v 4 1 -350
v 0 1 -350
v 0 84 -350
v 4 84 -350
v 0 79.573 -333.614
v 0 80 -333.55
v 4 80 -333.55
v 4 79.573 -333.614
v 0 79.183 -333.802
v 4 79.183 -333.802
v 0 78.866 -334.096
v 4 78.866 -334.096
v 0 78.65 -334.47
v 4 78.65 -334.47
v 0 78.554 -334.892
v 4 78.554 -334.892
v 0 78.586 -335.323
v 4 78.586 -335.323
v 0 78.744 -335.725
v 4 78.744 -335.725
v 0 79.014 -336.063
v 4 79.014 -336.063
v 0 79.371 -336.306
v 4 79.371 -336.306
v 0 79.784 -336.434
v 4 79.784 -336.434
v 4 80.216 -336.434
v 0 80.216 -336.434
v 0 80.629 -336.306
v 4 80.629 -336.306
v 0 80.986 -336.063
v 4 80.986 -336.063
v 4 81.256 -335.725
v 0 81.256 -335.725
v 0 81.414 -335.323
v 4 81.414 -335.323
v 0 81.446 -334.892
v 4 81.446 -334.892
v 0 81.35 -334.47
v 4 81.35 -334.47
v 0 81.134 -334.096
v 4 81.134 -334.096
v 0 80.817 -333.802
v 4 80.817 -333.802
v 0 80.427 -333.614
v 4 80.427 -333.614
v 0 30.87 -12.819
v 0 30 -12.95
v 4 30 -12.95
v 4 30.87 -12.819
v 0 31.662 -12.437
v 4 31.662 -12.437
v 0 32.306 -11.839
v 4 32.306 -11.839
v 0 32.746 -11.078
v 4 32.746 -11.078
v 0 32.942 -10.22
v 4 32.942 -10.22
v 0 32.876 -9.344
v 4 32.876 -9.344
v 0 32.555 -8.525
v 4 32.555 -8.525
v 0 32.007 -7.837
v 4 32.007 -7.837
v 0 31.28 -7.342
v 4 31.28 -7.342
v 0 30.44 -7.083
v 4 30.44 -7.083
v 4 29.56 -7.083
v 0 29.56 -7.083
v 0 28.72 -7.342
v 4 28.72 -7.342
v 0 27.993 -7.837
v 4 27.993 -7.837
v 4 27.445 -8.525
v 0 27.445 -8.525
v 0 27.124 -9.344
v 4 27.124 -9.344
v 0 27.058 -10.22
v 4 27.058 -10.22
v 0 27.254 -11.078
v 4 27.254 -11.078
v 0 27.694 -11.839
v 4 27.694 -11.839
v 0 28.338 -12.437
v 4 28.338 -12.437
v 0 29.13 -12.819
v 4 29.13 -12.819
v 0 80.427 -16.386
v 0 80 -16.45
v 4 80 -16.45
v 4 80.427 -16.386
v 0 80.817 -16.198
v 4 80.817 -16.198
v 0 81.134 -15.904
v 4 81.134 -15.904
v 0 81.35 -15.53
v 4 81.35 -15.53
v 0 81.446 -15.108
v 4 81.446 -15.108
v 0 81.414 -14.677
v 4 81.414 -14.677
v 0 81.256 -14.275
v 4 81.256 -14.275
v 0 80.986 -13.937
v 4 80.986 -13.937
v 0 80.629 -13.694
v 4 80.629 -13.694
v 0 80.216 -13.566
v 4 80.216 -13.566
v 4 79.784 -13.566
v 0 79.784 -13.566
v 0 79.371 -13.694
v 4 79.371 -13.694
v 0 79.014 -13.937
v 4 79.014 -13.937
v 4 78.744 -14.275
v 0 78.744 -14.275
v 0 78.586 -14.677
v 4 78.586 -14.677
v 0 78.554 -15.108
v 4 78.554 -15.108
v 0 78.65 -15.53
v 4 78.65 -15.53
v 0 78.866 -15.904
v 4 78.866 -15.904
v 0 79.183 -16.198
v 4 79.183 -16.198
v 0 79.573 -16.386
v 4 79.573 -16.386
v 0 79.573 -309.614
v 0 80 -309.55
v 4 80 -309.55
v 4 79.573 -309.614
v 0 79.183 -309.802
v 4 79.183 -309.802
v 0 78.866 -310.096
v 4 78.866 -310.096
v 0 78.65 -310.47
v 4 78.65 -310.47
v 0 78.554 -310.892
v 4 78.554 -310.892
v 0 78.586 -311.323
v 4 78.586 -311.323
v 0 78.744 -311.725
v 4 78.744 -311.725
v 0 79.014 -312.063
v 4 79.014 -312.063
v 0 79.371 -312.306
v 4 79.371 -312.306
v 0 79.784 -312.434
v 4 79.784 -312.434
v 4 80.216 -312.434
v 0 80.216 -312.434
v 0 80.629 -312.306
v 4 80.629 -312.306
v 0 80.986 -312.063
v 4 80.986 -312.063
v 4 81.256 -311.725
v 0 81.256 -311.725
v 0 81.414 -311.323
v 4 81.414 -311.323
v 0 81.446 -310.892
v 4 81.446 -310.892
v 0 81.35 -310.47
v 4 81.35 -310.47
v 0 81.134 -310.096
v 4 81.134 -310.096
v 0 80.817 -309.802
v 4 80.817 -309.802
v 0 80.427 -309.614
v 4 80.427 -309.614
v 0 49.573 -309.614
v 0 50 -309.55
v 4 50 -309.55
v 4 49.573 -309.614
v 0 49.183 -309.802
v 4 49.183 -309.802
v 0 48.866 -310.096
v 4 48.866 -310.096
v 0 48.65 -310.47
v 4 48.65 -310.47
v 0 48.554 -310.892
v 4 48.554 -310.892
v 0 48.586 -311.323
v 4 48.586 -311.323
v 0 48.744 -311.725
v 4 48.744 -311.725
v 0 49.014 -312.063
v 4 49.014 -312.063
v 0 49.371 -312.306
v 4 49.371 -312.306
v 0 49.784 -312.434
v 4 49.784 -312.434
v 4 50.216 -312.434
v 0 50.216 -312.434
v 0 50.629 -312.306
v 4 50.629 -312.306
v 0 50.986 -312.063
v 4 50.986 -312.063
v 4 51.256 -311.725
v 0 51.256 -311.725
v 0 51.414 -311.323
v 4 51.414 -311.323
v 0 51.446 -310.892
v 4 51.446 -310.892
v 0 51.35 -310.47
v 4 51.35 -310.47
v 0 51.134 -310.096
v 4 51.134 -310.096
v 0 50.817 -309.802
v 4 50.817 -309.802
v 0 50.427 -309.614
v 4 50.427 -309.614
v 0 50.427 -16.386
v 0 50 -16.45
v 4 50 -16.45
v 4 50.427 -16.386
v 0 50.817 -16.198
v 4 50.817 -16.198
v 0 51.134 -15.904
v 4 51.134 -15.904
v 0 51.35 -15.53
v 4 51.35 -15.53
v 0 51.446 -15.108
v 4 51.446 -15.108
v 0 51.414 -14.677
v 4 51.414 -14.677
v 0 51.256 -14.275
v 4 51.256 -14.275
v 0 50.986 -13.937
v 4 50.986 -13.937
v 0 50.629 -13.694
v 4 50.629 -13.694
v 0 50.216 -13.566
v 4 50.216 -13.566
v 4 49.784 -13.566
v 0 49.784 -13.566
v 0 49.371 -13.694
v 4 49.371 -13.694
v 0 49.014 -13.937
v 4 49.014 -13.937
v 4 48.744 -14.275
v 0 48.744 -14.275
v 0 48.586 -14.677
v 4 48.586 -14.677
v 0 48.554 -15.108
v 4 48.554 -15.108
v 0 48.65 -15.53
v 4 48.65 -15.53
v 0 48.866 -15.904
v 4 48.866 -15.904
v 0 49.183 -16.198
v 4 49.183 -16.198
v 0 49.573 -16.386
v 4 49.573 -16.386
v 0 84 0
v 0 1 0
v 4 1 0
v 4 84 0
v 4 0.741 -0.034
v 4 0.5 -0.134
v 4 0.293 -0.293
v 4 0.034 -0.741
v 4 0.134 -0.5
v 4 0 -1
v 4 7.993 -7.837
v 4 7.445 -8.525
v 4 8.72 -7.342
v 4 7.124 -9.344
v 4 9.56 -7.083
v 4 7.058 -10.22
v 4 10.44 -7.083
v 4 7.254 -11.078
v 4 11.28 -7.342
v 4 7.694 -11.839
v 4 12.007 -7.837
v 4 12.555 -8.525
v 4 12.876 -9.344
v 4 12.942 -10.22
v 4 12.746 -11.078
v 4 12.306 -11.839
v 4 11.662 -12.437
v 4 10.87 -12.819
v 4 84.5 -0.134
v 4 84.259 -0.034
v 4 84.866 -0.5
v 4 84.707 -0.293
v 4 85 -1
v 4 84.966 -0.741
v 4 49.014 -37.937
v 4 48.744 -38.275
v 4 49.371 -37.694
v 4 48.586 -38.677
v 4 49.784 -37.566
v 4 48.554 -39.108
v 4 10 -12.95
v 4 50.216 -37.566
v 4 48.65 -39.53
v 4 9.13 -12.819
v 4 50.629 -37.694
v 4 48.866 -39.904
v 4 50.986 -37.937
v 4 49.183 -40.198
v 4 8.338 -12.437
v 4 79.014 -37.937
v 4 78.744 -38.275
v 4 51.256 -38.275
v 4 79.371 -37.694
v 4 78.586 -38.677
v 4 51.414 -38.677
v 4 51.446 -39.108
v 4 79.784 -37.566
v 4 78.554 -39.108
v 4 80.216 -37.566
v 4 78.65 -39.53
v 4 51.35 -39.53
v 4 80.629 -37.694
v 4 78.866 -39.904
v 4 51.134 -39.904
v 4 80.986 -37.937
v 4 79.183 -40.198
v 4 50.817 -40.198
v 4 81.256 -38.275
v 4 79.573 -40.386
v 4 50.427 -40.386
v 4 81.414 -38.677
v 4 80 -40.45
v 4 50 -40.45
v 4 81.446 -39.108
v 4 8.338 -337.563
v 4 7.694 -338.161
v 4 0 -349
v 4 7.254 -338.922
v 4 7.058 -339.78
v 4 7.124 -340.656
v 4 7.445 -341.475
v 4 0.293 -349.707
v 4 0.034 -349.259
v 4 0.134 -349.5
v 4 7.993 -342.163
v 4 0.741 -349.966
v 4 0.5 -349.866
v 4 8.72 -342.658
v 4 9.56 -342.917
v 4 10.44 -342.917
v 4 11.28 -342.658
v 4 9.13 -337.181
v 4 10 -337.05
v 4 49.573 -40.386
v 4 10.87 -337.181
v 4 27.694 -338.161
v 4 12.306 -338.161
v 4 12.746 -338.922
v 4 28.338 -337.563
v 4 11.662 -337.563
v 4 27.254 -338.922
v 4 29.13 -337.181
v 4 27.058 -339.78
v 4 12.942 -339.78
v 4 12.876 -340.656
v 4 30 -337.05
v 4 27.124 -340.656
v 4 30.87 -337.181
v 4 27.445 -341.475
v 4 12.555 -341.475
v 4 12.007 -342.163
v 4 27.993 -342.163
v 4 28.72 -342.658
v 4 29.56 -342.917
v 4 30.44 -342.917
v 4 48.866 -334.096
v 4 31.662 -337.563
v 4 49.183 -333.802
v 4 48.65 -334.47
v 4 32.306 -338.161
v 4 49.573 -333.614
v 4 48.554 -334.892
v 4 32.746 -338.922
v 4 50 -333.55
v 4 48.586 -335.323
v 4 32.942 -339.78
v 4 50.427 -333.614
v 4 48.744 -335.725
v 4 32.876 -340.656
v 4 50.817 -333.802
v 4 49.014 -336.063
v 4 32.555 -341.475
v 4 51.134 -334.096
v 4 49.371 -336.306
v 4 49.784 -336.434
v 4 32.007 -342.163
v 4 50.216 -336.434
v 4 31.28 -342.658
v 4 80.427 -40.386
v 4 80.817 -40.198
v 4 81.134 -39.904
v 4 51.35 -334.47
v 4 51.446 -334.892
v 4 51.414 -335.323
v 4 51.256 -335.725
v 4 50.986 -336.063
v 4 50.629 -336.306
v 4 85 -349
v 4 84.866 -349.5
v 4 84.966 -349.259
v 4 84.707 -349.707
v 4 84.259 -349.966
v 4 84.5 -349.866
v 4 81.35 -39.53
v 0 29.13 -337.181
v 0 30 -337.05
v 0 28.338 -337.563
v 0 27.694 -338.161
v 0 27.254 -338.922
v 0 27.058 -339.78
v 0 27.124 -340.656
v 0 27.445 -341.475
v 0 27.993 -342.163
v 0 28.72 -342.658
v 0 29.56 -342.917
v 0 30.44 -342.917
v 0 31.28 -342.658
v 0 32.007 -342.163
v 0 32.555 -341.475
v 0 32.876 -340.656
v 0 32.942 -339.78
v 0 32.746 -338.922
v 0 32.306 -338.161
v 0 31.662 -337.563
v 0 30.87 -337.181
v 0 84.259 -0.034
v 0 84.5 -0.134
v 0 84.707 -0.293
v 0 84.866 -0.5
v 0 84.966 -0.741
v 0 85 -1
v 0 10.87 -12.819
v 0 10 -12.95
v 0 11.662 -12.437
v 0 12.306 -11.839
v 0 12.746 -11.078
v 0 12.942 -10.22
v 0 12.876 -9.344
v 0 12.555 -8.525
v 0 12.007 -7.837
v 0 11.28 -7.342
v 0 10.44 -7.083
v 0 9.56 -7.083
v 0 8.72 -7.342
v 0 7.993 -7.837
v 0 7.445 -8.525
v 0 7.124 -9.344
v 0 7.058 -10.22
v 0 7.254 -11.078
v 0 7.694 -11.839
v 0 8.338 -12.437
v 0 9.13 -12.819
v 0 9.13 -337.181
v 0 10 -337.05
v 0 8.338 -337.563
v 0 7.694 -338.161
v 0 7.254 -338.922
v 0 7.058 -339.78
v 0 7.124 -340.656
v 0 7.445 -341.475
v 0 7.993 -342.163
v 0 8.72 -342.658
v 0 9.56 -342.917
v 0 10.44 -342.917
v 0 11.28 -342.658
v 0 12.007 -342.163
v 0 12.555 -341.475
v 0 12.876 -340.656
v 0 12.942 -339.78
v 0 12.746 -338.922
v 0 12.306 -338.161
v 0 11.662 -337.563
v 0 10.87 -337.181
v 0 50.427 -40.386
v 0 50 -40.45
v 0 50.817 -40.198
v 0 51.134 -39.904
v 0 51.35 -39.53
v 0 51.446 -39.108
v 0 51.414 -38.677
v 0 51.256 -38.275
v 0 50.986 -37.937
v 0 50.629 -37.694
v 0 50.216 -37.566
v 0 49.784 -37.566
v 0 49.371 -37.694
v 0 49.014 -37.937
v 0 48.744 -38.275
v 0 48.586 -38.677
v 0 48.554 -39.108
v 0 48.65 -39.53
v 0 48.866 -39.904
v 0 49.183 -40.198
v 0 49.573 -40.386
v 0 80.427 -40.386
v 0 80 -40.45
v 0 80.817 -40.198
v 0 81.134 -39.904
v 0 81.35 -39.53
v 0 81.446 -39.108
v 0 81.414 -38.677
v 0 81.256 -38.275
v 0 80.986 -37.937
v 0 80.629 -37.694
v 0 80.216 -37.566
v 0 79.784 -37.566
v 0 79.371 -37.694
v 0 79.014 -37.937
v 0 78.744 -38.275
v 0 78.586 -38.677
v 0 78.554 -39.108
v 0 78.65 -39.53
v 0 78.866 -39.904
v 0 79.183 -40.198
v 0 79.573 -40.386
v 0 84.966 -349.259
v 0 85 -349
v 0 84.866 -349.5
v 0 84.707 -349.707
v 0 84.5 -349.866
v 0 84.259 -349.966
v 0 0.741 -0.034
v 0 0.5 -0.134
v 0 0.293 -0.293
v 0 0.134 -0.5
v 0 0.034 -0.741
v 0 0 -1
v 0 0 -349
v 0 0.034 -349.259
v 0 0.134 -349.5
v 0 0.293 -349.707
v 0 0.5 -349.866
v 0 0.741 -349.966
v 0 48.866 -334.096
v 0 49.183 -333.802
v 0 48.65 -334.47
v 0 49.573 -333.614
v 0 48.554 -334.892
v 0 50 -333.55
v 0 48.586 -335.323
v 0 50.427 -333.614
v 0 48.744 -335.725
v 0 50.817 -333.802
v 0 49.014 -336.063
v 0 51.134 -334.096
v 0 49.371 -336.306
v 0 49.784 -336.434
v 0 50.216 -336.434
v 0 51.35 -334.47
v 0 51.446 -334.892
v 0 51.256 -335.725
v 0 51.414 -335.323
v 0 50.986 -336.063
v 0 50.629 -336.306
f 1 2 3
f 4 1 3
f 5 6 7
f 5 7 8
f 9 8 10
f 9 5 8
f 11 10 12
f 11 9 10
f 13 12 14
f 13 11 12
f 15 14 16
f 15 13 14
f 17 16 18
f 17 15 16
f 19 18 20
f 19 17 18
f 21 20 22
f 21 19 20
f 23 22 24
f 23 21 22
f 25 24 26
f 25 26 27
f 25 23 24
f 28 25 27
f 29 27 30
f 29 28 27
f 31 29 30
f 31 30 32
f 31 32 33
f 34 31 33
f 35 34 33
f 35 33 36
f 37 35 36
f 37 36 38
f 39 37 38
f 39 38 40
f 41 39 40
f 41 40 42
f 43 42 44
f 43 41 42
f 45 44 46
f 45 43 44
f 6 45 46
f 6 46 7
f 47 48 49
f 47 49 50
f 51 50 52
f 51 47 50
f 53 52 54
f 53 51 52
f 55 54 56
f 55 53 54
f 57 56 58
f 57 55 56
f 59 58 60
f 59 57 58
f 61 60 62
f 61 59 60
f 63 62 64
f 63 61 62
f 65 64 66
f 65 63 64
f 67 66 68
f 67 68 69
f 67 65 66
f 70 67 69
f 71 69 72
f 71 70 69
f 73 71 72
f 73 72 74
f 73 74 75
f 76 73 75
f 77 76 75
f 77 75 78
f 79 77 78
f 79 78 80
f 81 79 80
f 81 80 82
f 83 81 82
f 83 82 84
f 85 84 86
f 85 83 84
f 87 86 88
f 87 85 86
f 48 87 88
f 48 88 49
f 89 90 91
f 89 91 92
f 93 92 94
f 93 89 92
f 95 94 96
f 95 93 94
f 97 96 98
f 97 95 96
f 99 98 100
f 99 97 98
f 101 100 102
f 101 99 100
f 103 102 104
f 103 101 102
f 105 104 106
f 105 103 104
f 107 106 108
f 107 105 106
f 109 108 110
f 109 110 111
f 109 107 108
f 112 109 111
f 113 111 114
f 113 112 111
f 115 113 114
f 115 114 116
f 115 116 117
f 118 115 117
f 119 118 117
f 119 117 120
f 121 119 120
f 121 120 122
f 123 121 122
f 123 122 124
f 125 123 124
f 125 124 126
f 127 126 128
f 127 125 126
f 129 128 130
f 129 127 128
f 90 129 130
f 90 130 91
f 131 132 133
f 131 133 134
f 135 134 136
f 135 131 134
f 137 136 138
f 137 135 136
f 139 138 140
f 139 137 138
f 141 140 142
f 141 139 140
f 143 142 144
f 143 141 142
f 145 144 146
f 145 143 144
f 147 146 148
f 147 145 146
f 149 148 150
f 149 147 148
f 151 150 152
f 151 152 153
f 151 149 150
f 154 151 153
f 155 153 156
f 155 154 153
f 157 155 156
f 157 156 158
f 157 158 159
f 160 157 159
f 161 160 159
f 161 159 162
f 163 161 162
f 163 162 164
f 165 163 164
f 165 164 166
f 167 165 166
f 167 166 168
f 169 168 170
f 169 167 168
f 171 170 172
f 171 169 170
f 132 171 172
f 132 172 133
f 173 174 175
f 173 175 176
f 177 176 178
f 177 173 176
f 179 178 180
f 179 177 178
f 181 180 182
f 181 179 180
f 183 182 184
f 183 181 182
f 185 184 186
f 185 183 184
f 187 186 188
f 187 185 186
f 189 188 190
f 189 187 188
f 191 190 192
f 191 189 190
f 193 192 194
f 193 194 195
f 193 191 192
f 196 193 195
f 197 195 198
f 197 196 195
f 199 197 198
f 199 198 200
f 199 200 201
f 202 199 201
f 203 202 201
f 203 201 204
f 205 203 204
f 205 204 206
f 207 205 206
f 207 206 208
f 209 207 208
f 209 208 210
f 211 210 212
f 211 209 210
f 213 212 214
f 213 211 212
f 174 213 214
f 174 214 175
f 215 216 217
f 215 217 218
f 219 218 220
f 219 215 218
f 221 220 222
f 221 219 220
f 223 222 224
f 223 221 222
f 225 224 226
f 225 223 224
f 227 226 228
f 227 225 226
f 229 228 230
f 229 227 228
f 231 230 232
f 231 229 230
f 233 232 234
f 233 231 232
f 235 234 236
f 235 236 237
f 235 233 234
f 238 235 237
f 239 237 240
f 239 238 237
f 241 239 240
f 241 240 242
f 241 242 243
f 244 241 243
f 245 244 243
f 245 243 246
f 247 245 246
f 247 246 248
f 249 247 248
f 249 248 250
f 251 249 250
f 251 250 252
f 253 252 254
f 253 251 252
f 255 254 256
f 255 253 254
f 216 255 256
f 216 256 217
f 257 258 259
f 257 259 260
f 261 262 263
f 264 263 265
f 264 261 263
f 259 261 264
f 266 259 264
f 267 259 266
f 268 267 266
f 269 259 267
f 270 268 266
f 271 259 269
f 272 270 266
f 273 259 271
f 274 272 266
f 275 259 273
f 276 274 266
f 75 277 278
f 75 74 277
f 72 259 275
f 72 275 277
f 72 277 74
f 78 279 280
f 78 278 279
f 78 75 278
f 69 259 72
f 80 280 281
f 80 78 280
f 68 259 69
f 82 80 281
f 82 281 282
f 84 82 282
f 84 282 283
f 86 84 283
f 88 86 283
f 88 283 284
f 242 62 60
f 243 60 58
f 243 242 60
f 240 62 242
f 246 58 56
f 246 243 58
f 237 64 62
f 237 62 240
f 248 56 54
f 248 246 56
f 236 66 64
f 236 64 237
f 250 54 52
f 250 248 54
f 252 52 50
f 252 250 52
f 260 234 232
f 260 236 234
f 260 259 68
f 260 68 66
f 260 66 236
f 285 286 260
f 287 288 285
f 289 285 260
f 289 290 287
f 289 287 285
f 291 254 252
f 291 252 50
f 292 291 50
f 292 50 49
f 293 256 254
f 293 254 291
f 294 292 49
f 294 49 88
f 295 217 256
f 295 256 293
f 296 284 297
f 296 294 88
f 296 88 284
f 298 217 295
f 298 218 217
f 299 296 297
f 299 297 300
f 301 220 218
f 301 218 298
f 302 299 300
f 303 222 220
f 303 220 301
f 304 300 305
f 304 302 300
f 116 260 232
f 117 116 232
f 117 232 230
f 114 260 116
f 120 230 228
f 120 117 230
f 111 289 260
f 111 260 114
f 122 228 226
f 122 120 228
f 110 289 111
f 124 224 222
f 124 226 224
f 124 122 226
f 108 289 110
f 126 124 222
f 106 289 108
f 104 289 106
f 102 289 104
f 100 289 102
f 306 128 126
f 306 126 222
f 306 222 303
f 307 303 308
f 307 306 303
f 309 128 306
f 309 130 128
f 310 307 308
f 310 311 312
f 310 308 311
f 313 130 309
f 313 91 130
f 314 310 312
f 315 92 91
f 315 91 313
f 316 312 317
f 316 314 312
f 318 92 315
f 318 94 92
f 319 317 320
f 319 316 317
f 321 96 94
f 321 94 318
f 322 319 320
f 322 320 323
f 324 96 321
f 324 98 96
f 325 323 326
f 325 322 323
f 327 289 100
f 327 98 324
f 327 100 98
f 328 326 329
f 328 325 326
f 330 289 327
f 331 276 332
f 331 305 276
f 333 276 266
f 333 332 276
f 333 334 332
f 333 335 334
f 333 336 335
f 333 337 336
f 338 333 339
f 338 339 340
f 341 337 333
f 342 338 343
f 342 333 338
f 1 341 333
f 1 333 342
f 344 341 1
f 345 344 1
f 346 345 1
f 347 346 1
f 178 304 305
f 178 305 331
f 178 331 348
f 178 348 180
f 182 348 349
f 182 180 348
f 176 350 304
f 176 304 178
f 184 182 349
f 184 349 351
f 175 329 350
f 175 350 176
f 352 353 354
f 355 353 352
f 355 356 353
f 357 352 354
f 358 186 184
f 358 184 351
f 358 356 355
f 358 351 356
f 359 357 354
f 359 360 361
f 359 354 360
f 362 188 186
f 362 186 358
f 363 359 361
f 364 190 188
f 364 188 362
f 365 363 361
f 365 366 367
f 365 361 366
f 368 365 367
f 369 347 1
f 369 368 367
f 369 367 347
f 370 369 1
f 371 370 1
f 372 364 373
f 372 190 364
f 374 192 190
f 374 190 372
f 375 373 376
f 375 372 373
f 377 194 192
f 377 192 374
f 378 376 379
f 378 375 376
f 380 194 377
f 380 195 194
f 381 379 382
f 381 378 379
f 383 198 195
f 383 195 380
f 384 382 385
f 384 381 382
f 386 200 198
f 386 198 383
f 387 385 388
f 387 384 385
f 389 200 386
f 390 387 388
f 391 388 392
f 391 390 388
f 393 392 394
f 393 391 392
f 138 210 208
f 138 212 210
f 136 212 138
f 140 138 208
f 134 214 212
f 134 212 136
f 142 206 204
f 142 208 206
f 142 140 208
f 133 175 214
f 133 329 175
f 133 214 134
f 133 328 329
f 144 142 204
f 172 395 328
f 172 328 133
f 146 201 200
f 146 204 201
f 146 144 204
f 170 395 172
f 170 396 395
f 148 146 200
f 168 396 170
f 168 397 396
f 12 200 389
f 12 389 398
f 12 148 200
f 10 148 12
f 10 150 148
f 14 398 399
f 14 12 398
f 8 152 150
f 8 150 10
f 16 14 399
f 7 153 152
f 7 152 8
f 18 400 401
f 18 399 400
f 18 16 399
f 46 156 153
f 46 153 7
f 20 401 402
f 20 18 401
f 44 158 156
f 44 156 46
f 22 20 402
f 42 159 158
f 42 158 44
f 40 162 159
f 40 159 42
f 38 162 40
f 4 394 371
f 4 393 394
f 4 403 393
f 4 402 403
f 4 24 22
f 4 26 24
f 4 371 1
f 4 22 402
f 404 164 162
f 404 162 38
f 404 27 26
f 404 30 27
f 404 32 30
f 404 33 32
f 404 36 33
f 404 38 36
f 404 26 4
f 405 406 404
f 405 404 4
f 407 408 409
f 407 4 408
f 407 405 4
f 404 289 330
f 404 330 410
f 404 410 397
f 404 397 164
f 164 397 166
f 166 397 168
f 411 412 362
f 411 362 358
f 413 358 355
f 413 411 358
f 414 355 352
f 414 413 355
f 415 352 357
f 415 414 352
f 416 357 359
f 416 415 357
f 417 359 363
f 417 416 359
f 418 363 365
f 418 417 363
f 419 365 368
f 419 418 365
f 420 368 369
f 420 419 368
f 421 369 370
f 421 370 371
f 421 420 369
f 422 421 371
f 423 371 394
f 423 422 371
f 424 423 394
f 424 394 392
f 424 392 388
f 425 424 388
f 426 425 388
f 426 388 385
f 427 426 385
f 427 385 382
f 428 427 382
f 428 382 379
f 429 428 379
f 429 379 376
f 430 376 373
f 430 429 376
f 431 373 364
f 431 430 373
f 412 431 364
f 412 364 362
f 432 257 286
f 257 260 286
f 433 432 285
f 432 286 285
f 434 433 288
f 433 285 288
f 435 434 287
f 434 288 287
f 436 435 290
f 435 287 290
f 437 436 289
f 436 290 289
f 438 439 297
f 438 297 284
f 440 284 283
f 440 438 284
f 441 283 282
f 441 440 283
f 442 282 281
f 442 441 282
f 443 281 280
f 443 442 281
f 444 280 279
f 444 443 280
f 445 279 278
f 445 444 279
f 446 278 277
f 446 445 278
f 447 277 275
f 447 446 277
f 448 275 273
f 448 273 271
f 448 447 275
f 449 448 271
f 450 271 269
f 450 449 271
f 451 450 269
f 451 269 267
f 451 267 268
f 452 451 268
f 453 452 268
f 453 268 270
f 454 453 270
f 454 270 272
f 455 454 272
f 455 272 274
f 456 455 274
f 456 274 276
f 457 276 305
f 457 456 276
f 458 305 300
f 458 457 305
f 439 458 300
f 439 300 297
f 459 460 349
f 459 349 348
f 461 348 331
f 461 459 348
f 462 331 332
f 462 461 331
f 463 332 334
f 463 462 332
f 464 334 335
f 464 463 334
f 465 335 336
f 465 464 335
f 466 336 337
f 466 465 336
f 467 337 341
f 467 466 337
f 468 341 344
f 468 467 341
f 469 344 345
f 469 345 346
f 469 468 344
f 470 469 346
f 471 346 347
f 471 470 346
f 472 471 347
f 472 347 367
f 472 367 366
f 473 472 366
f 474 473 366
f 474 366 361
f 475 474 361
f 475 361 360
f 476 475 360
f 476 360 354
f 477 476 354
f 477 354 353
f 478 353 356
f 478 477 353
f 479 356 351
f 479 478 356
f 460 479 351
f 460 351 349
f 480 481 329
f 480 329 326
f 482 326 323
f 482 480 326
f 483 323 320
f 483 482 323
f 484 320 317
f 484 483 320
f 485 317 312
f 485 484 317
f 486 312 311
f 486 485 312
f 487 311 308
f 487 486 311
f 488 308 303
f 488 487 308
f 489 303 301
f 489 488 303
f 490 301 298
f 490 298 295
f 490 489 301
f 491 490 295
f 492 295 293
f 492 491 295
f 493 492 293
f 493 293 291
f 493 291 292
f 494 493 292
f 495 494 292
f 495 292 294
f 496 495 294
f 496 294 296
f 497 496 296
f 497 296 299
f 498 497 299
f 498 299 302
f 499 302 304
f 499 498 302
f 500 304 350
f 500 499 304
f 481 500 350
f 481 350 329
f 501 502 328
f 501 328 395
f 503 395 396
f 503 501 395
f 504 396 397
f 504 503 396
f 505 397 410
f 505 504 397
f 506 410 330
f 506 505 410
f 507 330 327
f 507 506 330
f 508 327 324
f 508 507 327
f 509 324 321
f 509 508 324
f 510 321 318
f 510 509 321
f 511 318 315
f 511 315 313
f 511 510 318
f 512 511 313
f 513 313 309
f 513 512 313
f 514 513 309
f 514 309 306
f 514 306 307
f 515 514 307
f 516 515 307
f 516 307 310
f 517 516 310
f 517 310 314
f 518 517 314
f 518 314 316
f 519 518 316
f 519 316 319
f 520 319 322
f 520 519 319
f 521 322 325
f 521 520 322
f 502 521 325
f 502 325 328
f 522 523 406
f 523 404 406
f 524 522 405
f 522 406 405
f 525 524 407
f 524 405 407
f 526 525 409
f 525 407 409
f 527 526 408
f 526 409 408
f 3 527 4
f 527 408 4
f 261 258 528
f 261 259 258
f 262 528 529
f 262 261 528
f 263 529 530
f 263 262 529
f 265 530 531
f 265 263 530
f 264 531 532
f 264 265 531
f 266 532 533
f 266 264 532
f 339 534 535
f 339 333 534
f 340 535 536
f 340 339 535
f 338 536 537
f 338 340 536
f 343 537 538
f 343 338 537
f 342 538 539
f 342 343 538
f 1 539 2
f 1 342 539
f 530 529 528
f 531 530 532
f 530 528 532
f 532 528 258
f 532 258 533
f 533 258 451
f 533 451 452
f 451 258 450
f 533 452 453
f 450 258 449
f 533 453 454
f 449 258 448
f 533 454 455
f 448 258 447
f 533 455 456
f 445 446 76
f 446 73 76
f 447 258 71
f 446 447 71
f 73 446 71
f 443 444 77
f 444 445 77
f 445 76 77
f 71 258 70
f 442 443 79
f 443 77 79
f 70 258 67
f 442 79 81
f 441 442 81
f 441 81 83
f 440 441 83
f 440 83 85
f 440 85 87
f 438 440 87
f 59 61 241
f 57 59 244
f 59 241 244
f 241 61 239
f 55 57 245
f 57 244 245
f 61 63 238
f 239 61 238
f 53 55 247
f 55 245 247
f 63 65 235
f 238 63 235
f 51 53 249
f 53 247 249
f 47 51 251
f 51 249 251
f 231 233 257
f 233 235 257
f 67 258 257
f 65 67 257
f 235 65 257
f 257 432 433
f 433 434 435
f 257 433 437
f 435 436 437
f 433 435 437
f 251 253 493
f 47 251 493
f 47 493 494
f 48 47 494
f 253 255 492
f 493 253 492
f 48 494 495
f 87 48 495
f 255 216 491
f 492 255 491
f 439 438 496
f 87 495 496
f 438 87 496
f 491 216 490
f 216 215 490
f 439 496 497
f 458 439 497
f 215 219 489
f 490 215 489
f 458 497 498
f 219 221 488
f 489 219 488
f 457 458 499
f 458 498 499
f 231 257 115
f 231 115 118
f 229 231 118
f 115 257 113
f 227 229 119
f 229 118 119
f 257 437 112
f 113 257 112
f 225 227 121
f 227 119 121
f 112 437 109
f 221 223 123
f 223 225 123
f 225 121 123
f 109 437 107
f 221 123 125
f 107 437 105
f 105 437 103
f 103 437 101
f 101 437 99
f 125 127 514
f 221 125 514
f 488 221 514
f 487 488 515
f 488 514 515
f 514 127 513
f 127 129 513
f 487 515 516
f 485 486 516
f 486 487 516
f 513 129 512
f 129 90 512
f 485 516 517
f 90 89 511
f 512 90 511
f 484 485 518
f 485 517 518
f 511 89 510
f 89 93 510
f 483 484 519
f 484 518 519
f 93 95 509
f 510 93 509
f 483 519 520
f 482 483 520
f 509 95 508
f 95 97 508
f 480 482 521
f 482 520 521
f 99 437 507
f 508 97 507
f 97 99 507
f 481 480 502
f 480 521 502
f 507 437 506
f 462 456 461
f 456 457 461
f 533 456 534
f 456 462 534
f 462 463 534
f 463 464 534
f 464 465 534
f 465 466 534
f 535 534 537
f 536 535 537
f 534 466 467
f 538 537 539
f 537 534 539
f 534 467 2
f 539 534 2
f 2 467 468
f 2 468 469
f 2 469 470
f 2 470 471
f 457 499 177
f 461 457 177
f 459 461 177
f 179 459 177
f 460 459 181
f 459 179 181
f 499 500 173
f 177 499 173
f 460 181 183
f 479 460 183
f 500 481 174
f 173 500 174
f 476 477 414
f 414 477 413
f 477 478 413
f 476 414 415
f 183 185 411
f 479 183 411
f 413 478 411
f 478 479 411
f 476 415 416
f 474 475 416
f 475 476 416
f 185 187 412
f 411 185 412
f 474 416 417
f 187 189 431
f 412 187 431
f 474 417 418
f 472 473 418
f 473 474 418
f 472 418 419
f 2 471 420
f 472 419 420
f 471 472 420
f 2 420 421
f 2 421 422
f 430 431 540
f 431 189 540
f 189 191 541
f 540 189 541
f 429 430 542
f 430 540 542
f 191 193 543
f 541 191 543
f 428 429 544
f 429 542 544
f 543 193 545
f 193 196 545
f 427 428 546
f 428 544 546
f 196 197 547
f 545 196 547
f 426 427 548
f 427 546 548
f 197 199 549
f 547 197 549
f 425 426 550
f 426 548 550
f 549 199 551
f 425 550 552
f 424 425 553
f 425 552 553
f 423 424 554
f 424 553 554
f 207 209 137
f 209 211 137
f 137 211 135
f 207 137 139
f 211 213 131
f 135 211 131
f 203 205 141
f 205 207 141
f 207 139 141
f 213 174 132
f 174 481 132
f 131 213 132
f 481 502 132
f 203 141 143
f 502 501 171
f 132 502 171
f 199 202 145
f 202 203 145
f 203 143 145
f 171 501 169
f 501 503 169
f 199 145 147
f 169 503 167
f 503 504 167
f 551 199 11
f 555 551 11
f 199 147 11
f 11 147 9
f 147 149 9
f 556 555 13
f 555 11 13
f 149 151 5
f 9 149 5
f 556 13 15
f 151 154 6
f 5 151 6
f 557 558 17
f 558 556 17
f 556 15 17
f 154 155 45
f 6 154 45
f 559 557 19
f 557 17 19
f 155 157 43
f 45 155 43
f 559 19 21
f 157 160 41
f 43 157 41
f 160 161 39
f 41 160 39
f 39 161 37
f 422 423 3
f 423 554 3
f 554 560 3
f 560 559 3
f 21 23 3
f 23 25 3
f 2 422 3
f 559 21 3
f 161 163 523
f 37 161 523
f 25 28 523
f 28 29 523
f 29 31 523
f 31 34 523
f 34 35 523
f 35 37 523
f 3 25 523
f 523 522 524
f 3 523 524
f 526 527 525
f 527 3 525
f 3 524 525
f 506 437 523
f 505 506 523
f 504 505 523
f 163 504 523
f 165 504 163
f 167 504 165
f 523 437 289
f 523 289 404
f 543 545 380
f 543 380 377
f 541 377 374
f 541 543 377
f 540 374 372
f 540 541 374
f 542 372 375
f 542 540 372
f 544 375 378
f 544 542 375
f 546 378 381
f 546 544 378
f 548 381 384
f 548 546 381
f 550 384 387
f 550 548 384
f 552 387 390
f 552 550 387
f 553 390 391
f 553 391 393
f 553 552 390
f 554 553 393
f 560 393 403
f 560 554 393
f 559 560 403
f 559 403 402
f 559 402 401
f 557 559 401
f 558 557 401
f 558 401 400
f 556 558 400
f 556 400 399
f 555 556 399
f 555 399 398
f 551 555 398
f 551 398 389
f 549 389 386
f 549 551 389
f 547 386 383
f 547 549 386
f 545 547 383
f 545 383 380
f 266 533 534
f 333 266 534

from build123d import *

# Parameters (mm, degrees)
SKETCH_1_W      = 350
SKETCH_1_H      = 85
SKETCH_1_R      = 2.95
SKETCH_1_R_2    = 1.45
EXTRUDE_1_DEPTH = 4
FILLET_1_R      = 1


with BuildPart() as part:
    # 草图1 → 凸台-拉伸1 (new body)
    with BuildSketch(Plane(origin=(0, 0, 0), x_dir=(0, 0, -1), z_dir=(1, 0, 0))):
        with Locations((175, 42.5)):
            Rectangle(SKETCH_1_W, SKETCH_1_H)
        with Locations((10, 30)):
            Circle(SKETCH_1_R, mode=Mode.SUBTRACT)
        with Locations((10, 10)):
            Circle(SKETCH_1_R, mode=Mode.SUBTRACT)
        with Locations((15, 80)):
            Circle(SKETCH_1_R_2, mode=Mode.SUBTRACT)
        with Locations((39, 80)):
            Circle(SKETCH_1_R_2, mode=Mode.SUBTRACT)
        with Locations((15, 50)):
            Circle(SKETCH_1_R_2, mode=Mode.SUBTRACT)
        with Locations((39, 50)):
            Circle(SKETCH_1_R_2, mode=Mode.SUBTRACT)
        with Locations(Location((311, 50, 0), (0, 0, 180))):
            Circle(SKETCH_1_R_2, mode=Mode.SUBTRACT)
        with Locations(Location((335, 50, 0), (0, 0, 180))):
            Circle(SKETCH_1_R_2, mode=Mode.SUBTRACT)
        with Locations(Location((311, 80, 0), (0, 0, 180))):
            Circle(SKETCH_1_R_2, mode=Mode.SUBTRACT)
        with Locations(Location((335, 80, 0), (0, 0, 180))):
            Circle(SKETCH_1_R_2, mode=Mode.SUBTRACT)
        with Locations(Location((340, 10, 0), (0, 0, 180))):
            Circle(SKETCH_1_R, mode=Mode.SUBTRACT)
        with Locations(Location((340, 30, 0), (0, 0, 180))):
            Circle(SKETCH_1_R, mode=Mode.SUBTRACT)
    extrude(amount=EXTRUDE_1_DEPTH)

    # 圆角1
    fillet_1_edges = [part.edges().sort_by_distance(p)[0] for p in [
        (2, 85, 0),
        (2, 85, -350),
        (2, 0, -350),
        (2, 0, 0),
    ]]
    fillet(fillet_1_edges, radius=FILLET_1_R)


solid = part.part
